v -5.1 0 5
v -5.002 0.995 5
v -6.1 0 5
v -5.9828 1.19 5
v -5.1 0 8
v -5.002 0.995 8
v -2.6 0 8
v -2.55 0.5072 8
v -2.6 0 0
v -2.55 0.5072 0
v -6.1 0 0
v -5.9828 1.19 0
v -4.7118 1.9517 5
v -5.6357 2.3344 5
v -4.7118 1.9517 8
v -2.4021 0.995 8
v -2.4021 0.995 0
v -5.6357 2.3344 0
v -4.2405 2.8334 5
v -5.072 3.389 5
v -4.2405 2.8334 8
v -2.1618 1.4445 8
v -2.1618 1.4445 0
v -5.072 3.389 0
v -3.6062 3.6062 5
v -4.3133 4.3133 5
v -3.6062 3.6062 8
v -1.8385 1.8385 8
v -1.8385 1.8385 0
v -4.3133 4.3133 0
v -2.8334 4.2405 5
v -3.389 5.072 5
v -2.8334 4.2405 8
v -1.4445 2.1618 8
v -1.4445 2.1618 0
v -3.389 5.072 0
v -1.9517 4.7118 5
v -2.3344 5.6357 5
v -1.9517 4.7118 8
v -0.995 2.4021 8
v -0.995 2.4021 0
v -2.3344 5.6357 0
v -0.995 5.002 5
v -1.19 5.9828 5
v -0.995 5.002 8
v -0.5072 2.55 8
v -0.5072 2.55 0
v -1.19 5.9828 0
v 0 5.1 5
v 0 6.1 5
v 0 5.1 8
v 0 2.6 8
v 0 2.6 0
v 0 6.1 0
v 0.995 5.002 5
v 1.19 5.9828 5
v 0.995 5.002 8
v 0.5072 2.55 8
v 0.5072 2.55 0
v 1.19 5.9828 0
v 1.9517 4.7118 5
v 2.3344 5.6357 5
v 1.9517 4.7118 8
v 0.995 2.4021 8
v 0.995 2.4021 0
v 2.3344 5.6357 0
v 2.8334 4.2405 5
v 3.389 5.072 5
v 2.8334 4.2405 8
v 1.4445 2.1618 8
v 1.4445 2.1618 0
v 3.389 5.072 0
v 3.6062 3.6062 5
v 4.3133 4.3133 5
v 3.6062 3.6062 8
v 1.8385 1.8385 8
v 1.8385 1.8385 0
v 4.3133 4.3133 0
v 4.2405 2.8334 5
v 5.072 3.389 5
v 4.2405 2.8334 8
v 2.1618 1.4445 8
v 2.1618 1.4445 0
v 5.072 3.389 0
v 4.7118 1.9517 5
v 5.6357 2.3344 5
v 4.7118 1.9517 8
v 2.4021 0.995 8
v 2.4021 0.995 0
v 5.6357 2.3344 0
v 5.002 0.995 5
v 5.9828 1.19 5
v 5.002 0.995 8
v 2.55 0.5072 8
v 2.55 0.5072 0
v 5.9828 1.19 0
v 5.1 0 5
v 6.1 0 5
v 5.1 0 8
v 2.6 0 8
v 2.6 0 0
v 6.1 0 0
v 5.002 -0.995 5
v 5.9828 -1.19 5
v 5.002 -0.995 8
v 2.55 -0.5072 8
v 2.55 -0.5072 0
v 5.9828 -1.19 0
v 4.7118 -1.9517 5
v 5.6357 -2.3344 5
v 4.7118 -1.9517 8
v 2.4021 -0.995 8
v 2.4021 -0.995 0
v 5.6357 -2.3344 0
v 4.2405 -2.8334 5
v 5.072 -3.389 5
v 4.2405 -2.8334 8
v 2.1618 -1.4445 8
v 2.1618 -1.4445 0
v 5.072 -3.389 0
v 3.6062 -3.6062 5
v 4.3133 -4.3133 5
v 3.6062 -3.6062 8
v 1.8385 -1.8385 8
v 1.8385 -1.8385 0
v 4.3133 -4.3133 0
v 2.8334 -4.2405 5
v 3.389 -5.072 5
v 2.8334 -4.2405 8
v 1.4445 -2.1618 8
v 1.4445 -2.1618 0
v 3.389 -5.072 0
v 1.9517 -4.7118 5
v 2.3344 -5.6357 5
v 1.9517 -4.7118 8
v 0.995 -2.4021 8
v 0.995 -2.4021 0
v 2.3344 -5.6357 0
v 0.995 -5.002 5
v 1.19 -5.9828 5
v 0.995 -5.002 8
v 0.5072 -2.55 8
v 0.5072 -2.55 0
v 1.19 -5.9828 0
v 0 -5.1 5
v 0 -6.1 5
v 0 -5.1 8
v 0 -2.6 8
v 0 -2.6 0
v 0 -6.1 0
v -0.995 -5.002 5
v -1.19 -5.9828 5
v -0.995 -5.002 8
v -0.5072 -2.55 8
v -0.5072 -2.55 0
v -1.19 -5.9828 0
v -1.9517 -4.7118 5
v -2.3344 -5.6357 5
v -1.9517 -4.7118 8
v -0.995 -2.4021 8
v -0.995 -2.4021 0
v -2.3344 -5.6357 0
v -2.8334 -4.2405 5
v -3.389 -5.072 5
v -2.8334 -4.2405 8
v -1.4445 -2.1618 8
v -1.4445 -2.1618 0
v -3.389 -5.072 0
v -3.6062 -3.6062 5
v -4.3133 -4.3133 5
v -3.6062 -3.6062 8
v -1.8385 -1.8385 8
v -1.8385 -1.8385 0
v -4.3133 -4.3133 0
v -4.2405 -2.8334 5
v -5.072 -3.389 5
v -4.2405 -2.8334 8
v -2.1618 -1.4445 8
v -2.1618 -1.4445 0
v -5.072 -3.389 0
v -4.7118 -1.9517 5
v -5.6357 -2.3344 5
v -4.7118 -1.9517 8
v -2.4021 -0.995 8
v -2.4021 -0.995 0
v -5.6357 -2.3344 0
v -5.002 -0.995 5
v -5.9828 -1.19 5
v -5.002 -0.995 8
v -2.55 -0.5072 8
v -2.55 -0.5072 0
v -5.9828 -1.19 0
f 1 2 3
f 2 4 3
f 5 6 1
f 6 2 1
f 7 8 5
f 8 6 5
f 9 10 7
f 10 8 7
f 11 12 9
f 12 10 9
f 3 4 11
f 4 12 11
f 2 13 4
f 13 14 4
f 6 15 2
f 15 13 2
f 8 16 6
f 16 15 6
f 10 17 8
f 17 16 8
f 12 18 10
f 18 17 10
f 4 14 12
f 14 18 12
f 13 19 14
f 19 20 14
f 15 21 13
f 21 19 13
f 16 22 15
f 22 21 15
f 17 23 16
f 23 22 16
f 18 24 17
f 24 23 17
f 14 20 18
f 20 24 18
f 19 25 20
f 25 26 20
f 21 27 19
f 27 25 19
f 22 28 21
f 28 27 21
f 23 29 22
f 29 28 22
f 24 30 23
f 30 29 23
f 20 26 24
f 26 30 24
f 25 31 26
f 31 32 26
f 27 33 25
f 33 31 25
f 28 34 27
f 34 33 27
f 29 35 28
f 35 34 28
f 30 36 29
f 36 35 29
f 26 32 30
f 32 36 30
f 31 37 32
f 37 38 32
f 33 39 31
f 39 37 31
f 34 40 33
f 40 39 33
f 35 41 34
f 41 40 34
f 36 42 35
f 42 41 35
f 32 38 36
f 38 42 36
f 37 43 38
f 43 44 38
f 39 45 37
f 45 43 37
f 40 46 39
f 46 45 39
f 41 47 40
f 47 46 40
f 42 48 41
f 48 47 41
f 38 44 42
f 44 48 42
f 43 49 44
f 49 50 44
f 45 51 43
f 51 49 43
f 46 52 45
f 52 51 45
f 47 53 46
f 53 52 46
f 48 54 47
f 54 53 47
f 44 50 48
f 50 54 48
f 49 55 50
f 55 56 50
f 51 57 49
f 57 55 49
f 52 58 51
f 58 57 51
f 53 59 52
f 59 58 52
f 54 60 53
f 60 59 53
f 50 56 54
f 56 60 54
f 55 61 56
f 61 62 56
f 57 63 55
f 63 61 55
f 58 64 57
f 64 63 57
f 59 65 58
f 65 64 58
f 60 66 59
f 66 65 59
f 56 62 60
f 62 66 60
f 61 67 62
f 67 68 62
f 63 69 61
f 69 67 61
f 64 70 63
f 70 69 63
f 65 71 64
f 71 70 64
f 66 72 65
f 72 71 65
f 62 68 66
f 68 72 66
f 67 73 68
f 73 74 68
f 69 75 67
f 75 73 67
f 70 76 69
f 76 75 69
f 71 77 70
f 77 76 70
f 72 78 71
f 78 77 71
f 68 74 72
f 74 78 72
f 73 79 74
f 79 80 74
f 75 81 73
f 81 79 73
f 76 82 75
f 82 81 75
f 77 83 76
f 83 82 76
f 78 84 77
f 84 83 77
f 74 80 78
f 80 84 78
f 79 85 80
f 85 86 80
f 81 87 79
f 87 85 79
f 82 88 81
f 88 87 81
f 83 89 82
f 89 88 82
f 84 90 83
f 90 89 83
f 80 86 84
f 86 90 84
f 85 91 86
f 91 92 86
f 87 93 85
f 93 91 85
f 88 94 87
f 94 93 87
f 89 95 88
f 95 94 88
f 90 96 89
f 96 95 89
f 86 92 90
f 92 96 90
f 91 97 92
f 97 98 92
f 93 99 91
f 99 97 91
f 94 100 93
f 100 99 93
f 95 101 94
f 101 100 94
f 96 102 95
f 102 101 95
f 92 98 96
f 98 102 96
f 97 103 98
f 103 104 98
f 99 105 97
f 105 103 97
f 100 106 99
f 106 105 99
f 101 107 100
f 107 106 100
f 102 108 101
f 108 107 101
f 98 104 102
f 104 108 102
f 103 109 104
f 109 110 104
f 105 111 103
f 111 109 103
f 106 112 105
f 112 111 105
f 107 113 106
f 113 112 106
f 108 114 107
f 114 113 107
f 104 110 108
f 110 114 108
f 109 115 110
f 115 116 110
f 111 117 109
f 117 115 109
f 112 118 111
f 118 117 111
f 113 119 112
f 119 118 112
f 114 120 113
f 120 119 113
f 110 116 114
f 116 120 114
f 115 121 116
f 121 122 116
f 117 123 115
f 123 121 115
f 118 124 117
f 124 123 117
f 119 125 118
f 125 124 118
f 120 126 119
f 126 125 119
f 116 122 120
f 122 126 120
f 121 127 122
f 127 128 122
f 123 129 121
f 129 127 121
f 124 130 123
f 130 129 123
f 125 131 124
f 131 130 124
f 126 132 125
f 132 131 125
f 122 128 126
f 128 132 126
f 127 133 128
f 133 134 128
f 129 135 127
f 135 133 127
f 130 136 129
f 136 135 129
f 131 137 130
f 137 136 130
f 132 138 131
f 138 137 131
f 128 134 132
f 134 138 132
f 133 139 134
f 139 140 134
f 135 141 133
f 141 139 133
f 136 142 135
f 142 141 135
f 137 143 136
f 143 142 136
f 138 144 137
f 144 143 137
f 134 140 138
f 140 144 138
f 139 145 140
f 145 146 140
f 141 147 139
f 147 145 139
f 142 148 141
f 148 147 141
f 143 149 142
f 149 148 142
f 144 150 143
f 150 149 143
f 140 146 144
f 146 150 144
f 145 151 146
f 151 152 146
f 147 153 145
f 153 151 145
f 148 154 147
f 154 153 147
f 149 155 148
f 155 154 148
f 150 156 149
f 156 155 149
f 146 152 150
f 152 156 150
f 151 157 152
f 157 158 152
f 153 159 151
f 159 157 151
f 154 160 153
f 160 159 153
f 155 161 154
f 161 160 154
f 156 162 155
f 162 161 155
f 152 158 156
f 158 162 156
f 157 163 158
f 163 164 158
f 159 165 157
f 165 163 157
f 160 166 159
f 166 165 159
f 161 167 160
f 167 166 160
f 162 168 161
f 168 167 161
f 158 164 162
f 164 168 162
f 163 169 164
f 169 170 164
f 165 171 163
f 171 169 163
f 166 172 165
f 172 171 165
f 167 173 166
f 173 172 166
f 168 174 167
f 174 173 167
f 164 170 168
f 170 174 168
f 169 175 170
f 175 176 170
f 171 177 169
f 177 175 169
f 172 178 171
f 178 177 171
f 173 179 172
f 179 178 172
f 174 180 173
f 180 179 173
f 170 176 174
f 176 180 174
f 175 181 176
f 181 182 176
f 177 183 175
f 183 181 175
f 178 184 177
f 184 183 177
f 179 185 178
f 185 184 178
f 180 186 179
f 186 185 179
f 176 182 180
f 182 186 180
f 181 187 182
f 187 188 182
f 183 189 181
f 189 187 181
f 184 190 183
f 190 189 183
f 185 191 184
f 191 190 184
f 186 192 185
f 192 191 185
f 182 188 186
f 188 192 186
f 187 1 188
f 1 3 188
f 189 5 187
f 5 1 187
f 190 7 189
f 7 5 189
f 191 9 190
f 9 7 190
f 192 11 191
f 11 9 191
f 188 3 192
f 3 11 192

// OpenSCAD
$fn = 32;

// ----------------------------------------------------------------------
// Form washer: stepped_c washer, 12.2 mm outside, 5.2 mm bore
// ----------------------------------------------------------------------

// --- parameters (mm) ---
revolve_angle = 360;      // full turn around the Z axis
profile_points = 6;       // points of the closed outline

profile = [[2.6, 0], [6.1, 0], [6.1, 5], [5.1, 5], [5.1, 8], [2.6, 8]];  // single closed polygon, 6 points, counter clockwise

// --- the one profile operation ---
rotate_extrude(angle = revolve_angle) polygon(points = profile);
